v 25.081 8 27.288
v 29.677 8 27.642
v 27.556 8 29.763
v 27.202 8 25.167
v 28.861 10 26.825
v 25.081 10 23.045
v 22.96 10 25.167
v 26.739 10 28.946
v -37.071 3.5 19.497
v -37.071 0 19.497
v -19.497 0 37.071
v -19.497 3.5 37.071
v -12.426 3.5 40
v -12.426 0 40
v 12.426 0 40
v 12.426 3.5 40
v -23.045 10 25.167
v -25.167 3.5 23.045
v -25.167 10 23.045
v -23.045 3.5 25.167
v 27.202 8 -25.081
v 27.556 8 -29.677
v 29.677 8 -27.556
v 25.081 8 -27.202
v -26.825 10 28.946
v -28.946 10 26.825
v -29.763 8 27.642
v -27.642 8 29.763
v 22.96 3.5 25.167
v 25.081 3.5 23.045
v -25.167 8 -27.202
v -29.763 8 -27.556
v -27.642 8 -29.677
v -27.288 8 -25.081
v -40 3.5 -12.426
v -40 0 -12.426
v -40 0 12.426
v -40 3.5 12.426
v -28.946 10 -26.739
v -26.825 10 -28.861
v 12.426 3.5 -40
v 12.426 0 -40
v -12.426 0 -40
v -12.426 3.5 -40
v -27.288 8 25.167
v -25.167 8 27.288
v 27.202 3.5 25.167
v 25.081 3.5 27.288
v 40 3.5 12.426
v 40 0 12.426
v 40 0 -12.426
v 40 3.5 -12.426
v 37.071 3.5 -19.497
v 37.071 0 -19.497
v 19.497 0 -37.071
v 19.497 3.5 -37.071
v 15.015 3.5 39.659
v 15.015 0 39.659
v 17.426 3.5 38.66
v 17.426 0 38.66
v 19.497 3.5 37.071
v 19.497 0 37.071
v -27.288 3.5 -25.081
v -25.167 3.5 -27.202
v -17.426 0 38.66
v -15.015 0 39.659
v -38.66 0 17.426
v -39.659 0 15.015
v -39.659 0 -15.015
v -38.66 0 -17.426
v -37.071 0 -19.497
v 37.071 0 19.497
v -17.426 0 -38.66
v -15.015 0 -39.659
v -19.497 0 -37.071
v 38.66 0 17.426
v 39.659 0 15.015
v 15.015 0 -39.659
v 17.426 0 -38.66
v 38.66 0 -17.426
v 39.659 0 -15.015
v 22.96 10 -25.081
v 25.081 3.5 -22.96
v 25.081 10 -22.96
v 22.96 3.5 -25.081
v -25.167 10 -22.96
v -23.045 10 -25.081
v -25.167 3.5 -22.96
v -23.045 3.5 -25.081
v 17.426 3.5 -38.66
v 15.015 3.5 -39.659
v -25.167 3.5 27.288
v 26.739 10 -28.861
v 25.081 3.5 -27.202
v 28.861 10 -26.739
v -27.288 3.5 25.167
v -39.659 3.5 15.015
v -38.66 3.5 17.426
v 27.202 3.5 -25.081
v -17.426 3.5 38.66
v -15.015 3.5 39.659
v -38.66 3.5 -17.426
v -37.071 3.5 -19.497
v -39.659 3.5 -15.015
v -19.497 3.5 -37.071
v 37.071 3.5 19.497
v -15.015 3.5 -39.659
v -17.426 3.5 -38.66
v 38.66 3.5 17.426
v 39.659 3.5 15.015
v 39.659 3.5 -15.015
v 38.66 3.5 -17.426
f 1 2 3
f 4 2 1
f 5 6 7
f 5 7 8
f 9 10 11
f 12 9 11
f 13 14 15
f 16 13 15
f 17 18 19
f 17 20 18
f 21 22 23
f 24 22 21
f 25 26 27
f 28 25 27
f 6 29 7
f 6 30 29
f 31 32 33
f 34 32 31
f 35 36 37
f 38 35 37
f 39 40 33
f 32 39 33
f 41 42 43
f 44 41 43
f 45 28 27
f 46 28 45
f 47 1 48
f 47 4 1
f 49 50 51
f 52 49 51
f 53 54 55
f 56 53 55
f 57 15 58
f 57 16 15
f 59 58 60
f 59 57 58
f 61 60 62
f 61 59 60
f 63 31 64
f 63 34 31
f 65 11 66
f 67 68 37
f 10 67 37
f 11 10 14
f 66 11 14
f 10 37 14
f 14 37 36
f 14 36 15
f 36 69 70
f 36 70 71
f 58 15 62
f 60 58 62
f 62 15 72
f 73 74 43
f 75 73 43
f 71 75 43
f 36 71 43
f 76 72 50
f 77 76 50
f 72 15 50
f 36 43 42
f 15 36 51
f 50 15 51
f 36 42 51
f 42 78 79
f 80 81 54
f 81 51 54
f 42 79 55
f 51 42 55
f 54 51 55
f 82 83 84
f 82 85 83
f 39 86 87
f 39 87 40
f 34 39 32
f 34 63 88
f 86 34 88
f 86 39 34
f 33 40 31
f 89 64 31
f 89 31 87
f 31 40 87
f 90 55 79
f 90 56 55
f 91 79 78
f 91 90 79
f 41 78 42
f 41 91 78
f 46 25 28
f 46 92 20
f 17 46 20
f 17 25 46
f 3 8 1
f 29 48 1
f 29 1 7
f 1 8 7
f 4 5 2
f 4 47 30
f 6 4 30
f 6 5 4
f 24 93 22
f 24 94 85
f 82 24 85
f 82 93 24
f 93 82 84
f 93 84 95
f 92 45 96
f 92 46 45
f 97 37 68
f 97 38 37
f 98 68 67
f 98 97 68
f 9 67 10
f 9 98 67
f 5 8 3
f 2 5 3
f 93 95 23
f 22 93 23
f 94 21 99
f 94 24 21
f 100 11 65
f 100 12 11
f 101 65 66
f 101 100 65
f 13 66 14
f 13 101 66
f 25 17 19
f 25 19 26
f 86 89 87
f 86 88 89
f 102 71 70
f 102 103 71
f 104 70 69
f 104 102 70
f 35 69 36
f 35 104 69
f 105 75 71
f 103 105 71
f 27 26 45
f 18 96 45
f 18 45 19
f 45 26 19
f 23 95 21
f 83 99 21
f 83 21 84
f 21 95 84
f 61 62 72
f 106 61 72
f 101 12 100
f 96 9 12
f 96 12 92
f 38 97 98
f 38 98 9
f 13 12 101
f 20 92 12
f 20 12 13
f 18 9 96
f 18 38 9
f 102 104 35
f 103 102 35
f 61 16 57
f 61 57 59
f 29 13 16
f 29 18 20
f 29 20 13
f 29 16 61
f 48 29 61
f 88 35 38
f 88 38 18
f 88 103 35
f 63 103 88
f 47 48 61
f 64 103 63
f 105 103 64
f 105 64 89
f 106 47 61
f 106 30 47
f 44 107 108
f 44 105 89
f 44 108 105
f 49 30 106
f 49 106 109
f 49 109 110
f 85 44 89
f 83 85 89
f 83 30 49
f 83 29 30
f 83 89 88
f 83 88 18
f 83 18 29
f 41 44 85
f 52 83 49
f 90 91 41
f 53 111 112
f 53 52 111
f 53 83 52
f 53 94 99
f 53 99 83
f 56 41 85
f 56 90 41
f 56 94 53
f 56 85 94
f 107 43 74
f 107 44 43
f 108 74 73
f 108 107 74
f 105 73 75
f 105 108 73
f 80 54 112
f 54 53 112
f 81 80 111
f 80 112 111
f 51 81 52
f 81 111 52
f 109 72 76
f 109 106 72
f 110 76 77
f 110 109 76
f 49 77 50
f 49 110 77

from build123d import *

# Parameters (mm, degrees)
BOSS_EXTRUDE1_DEPTH = 3.5
FILLET1_R           = 10
BOSS_EXTRUDE2_DEPTH = 1.5
CIRPATTERN1_COUNT   = 4


with BuildPart() as part:
    # Sketch1 → Boss-Extrude1 (new body)
    with BuildSketch(Plane(origin=(0, 0, 0), x_dir=(1, 0, 0), z_dir=(0, 1, 0))):
        Polygon((40, 16.568542495), (16.568542495, 40), (-16.568542495, 40), (-40, 16.568542495), (-40, -16.568542495), (-16.568542495, -40), (16.568542495, -40), (40, -16.568542495), align=None)
    extrude(amount=BOSS_EXTRUDE1_DEPTH)

    # Fillet1
    fillet1_edges = [part.edges().sort_by_distance(p)[0] for p in [
        (40, 1.75, 16.568542495),
        (16.568542495, 1.75, 40),
        (-16.568542495, 1.75, 40),
        (-40, 1.75, 16.568542495),
        (-40, 1.75, -16.568542495),
        (-16.568542495, 1.75, -40),
        (16.568542495, 1.75, -40),
        (40, 1.75, -16.568542495),
    ]]
    fillet(fillet1_edges, radius=FILLET1_R)

    # Sketch3 → Boss-Extrude2 (add, symmetric)
    with BuildSketch(Plane(origin=(0, 0, 0), x_dir=(-0.707106781, 0, 0.707106781), z_dir=(-0.707106781, 0, -0.707106781))):
        Polygon((-33.97, 3.5), (-33.97, 10), (-39.315299462, 10), (-40.47, 8), (-36.97, 8), (-36.97, 3.5), align=None)
    boss_extrude2 = extrude(amount=BOSS_EXTRUDE2_DEPTH, both=True)

    # CirPattern1: Boss-Extrude2 ×4 about axis
    cirpattern1_axis = Axis((-0.042786503, 0, 0.042786503), (0, 1, 0))
    for i in range(1, CIRPATTERN1_COUNT):
        add(boss_extrude2.rotate(cirpattern1_axis, i * 360 / CIRPATTERN1_COUNT))


solid = part.part
